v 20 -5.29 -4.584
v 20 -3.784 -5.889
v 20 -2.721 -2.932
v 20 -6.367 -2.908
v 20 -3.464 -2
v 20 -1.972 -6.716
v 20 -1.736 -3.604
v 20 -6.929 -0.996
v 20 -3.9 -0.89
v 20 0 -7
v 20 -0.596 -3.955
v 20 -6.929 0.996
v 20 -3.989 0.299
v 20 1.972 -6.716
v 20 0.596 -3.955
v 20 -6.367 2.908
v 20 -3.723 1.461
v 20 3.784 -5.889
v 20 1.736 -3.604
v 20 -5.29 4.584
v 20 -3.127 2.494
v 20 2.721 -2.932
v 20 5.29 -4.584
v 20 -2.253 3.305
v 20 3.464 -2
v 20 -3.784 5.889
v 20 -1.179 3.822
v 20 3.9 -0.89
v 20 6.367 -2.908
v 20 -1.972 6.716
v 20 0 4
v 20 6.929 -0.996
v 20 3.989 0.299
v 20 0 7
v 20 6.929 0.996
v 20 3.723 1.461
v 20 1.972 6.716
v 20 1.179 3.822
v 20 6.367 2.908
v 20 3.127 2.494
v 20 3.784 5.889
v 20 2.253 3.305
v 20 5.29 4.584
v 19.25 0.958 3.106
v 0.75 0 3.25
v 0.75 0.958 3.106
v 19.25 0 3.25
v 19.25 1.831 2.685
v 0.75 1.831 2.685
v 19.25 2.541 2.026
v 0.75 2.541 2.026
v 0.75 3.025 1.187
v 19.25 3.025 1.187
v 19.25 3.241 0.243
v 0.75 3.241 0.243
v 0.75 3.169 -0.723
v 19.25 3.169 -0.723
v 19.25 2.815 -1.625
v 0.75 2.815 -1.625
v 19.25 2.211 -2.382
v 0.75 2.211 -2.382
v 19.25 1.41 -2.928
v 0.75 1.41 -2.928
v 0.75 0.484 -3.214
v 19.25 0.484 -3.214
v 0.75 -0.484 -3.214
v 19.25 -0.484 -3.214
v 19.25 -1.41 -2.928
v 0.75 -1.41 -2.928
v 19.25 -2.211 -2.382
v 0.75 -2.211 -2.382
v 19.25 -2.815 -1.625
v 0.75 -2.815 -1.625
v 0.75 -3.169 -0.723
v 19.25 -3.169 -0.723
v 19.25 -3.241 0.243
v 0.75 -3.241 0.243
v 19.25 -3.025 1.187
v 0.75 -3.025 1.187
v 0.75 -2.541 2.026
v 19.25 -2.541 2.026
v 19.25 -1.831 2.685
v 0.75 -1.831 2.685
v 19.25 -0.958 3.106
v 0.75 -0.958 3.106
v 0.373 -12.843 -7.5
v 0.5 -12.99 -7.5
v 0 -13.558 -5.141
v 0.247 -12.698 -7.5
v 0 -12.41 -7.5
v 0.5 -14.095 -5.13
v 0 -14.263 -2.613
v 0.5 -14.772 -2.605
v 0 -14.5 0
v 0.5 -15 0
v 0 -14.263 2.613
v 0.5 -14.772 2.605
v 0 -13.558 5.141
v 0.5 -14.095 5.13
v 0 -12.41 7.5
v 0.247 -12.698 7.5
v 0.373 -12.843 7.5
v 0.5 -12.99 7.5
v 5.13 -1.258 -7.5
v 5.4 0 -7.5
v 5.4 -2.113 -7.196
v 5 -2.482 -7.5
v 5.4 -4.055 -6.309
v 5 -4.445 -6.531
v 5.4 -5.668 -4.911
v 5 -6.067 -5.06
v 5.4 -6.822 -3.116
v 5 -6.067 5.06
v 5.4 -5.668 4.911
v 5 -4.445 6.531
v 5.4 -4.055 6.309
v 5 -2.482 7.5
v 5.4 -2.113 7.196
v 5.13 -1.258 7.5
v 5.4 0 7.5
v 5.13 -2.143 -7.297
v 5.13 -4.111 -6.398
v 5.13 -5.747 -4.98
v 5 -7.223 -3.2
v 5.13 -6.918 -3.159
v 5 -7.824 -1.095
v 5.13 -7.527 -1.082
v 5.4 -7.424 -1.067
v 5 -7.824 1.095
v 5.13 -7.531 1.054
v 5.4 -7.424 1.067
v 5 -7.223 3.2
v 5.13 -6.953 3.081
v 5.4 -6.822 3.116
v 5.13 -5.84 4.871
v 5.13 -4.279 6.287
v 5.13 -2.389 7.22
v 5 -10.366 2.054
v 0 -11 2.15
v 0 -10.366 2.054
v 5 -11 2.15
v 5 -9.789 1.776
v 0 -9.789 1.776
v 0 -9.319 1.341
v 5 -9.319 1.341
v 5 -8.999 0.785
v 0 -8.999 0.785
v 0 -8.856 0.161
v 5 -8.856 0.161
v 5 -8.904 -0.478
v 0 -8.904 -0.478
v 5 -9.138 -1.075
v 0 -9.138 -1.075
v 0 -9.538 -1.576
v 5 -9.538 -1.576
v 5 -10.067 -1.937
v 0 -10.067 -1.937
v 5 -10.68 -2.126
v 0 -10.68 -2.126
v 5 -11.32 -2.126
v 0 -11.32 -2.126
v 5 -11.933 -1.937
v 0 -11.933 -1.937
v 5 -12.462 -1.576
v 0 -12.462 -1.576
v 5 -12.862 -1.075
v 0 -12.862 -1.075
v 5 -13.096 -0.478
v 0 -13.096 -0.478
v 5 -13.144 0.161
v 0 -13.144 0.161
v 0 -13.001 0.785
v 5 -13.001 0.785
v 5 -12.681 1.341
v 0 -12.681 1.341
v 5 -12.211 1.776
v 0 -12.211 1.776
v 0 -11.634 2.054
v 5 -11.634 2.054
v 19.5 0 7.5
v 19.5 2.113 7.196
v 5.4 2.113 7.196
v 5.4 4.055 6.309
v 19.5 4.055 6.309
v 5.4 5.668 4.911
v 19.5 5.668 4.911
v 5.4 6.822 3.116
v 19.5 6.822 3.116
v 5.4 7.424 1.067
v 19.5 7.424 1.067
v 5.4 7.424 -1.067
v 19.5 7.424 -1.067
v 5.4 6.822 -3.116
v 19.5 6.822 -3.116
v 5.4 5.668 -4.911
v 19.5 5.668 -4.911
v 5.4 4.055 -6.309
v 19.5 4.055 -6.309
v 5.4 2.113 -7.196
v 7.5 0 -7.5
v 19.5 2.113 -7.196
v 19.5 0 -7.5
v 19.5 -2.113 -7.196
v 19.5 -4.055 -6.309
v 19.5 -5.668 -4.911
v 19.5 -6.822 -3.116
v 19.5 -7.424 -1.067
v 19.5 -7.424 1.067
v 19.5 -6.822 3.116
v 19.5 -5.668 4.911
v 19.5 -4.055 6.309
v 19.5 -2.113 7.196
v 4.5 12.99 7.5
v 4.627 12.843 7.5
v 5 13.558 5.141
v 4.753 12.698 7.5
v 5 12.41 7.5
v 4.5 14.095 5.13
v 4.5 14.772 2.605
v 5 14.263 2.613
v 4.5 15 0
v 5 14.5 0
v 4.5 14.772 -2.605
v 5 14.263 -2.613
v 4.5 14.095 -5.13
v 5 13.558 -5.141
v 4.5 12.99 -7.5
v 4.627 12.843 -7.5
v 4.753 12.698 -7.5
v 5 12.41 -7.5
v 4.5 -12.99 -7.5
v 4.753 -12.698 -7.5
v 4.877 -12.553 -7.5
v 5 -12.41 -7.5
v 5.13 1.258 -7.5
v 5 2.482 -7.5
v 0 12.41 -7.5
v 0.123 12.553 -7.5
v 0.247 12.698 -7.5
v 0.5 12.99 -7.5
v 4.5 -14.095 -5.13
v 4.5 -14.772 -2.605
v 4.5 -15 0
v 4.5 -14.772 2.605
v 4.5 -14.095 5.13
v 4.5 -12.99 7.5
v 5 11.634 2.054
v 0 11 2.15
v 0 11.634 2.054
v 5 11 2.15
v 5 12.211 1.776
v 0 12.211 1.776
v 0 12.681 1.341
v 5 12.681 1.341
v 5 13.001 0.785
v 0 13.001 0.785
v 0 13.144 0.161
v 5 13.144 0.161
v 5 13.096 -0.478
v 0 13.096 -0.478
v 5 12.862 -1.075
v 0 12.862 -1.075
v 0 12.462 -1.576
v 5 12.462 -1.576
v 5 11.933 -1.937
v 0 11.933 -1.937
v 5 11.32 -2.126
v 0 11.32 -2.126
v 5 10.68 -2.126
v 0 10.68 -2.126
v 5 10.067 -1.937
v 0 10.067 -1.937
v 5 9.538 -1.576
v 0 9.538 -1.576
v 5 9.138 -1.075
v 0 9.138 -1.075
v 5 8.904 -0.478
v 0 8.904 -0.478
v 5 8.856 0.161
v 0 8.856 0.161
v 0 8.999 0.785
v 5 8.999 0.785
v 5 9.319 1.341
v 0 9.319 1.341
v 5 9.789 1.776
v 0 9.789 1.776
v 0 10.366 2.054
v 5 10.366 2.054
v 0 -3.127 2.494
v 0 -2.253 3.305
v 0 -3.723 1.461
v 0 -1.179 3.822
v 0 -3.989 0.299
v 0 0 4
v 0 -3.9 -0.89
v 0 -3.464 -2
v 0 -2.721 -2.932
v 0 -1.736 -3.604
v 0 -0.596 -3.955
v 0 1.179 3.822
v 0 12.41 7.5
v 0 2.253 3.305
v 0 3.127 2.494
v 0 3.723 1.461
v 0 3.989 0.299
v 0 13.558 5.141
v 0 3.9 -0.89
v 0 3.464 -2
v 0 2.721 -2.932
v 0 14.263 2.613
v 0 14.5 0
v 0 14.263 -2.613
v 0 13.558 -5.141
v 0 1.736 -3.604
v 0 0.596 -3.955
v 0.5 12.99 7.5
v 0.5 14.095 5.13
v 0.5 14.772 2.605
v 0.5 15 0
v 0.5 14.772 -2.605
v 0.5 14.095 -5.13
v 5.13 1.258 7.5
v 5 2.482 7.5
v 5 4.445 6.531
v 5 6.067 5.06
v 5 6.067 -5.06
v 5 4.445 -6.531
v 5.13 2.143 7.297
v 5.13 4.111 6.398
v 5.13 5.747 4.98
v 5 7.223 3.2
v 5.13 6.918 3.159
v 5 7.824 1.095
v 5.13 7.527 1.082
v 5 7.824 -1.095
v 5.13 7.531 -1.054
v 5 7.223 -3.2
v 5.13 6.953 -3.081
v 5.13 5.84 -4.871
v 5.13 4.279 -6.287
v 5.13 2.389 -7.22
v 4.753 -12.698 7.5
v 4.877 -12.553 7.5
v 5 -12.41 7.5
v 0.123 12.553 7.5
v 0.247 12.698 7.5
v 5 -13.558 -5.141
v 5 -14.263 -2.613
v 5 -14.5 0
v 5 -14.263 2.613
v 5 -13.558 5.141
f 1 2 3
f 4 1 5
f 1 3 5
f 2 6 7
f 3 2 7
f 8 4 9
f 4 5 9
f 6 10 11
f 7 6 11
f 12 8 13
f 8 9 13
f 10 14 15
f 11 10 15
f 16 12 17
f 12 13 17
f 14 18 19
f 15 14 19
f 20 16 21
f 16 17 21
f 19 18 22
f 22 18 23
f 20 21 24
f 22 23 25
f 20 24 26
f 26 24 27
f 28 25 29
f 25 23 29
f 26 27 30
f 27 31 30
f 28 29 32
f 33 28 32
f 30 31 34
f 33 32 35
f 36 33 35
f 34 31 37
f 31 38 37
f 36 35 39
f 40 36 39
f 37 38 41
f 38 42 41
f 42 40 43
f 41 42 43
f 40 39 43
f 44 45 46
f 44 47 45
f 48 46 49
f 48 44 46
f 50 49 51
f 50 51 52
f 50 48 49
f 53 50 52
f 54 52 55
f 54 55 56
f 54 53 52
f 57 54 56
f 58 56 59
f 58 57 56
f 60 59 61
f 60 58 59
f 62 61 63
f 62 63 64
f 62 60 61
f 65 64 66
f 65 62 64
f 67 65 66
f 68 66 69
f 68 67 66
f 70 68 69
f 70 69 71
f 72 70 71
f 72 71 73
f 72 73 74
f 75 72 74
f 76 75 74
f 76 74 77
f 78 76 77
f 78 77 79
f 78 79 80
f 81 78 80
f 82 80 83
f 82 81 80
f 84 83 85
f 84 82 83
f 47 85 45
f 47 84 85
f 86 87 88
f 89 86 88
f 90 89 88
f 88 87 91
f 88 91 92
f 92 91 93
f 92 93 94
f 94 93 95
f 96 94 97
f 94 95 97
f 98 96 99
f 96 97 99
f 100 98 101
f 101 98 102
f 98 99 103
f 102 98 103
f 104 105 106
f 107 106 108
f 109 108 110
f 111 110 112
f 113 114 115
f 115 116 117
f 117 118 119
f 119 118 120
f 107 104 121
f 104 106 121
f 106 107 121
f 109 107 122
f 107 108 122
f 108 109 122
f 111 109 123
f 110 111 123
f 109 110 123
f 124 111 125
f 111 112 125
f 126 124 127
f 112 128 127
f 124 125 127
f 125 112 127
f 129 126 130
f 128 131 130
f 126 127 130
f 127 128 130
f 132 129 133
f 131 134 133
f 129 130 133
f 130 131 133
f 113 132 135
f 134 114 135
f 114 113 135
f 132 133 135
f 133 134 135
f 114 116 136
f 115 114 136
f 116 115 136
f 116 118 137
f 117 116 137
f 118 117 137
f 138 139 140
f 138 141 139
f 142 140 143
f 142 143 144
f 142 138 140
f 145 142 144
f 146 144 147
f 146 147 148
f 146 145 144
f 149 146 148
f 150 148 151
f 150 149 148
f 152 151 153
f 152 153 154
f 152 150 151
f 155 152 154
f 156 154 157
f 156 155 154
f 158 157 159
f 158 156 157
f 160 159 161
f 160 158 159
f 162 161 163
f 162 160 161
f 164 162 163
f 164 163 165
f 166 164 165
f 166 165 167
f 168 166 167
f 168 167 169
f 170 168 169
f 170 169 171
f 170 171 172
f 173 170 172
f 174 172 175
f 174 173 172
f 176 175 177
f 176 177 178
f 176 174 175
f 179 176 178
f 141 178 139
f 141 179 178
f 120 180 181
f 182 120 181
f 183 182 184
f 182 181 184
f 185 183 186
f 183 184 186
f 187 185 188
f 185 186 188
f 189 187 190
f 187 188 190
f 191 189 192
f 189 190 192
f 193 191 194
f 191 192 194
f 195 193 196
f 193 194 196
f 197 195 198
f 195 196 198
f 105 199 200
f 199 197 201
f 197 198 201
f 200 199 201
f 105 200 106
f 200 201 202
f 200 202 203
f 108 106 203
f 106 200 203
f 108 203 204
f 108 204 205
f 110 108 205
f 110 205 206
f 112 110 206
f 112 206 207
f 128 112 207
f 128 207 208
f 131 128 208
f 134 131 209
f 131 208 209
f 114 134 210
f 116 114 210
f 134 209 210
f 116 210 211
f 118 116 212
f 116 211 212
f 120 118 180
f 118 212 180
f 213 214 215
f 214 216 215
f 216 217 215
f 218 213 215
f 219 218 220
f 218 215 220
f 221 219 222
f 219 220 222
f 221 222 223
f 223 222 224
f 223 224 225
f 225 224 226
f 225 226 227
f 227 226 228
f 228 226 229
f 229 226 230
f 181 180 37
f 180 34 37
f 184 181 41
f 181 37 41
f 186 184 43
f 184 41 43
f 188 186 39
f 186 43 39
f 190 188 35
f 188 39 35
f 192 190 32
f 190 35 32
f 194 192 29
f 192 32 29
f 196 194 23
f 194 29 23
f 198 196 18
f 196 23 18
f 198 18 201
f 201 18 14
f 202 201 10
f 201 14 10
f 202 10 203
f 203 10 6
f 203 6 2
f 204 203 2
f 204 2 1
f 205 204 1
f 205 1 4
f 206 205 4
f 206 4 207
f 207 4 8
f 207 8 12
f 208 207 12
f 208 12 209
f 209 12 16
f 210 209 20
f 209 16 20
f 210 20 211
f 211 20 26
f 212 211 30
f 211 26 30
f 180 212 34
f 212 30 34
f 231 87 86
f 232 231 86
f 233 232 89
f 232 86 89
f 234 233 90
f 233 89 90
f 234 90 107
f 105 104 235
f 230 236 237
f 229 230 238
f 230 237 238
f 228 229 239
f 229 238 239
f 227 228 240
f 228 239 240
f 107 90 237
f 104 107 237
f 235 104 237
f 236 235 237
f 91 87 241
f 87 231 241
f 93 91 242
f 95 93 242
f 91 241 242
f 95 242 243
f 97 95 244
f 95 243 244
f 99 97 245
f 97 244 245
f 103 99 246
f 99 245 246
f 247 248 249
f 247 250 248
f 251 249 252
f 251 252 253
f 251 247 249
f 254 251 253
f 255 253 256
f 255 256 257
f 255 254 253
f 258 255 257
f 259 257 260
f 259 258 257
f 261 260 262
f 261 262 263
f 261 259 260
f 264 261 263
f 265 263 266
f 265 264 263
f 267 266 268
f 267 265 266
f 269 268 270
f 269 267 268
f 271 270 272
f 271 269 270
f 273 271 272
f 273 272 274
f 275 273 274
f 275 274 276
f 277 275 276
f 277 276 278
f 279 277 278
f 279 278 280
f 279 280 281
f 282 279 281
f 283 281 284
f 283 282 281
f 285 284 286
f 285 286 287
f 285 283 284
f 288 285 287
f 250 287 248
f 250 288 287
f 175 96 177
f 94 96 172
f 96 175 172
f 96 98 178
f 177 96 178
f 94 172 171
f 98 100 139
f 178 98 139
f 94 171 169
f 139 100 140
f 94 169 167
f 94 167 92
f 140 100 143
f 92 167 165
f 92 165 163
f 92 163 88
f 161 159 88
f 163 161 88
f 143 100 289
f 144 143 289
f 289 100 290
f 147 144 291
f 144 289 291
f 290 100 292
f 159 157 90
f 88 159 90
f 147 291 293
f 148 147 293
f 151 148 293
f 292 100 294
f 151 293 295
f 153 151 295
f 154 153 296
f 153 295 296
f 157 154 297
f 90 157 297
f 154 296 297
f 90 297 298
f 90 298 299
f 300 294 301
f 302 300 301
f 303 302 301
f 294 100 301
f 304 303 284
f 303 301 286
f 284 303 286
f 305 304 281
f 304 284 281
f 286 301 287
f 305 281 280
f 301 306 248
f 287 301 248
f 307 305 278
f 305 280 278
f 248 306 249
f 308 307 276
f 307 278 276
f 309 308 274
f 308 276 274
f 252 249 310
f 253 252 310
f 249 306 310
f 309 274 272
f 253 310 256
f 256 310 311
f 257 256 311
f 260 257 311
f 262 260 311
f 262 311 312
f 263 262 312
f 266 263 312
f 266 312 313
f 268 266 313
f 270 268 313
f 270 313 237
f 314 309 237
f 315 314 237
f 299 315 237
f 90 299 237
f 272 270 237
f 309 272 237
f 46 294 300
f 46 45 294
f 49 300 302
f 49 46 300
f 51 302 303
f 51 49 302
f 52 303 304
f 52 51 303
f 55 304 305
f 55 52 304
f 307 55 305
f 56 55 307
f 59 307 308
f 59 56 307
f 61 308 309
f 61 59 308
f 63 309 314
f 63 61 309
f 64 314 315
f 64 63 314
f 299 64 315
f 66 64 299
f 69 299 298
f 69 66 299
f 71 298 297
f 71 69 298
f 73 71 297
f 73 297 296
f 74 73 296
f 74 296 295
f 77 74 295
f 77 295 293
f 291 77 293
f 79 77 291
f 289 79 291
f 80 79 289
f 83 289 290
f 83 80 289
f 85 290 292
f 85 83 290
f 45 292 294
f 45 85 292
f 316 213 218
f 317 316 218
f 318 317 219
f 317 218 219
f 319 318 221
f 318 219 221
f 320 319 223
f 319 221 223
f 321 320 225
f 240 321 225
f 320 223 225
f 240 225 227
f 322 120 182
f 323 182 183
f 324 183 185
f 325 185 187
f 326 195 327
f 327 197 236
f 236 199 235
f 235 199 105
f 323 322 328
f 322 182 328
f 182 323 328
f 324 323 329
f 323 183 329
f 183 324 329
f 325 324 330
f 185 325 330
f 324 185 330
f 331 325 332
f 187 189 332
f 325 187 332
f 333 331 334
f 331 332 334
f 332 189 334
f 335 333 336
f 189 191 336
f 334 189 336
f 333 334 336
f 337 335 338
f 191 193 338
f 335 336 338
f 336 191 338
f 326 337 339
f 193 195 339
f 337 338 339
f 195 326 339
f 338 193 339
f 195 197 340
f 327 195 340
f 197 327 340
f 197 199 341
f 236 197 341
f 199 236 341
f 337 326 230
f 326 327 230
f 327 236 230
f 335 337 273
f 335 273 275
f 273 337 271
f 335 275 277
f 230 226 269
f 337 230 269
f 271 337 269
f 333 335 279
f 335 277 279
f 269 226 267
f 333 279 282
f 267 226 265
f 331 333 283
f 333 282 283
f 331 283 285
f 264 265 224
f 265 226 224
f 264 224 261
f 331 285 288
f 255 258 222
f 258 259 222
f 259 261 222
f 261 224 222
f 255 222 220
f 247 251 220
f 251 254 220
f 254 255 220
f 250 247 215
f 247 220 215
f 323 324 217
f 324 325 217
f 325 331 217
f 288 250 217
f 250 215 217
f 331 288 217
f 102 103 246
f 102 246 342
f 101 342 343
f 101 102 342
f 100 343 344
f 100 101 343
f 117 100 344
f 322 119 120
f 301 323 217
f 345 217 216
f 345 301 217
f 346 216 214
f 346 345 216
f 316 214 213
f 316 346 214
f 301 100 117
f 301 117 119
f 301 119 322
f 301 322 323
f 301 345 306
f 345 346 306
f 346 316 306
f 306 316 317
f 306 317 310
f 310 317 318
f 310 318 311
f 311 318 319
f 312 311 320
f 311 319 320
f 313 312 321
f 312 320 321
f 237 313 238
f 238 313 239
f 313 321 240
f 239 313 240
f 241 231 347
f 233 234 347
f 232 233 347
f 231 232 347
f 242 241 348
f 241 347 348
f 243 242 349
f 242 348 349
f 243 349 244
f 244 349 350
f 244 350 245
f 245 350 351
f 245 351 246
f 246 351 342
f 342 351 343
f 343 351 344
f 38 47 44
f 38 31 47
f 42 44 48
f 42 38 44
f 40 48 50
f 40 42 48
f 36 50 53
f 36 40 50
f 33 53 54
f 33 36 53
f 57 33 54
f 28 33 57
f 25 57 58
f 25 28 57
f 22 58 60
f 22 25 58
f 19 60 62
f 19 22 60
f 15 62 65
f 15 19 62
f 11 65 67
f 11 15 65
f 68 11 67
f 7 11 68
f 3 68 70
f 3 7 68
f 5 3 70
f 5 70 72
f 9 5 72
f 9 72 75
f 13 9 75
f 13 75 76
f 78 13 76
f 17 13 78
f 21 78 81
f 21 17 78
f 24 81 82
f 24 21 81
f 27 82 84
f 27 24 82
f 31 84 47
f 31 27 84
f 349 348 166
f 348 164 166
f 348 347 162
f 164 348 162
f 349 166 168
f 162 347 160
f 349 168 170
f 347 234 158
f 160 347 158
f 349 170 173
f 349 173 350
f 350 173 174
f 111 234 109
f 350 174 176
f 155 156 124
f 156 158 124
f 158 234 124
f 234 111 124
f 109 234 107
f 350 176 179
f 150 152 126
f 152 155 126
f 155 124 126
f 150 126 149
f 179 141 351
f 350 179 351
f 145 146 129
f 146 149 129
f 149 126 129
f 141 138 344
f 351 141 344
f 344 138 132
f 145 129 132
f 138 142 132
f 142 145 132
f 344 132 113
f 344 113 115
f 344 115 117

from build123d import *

# Parameters (mm, degrees)
SKETCH3_W               = 5
SKETCH3_H               = 2.15
SKETCH4_W               = 5
SKETCH4_H               = 2.15
CUT_EXTRUDE1_DEPTH      = 7.5
CUT_EXTRUDE1_DEPTH_BACK = 7.5
SKETCH5_W               = 30
SKETCH5_H               = 90
SKETCH5_W_2             = 15
SKETCH5_H_2             = 60


with BuildPart() as part:
    # Sketch1 → Revolve1 (revolve)
    with BuildSketch(Plane.XY, mode=Mode.PRIVATE) as revolve1_sk:
        with BuildLine():
            Line((0, 0), (0, 14.5))
            Line((0, 14.5), (0.5, 15))
            Line((0.5, 15), (4.5, 15))
            Line((4.5, 15), (5, 14.5))
            Line((5, 14.5), (5, 7.9))
            ThreePointArc((5, 7.9), (5.117157288, 7.617157288), (5.4, 7.5))
            Line((5.4, 7.5), (19.5, 7.5))
            Line((19.5, 7.5), (20, 7))
            Line((20, 7), (20, 0))
            Line((20, 0), (0, 0))
        make_face()
    revolve(revolve1_sk.sketch.rotate(Axis((20, 0, 0), (-1, 0, 0)), 270), axis=Axis((20, 0, 0), (-1, 0, 0)))

    # Sketch2 → Cut-Revolve1 (revolve, cut)
    with BuildSketch(Plane.XY, mode=Mode.PRIVATE) as cut_revolve1_sk:
        Polygon((0, 0), (0, 4), (0.75, 3.25), (19.25, 3.25), (20, 4), (20, 0), align=None)
    revolve(cut_revolve1_sk.sketch.rotate(Axis((20, 0, 0), (-1, 0, 0)), 270), axis=Axis((20, 0, 0), (-1, 0, 0)), mode=Mode.SUBTRACT)

    # Sketch3 → Cut-Revolve2 (revolve, cut)
    with BuildSketch(Plane.XY, mode=Mode.PRIVATE) as cut_revolve2_sk:
        with Locations((2.5, 12.075)):
            Rectangle(SKETCH3_W, SKETCH3_H)
    revolve(cut_revolve2_sk.sketch.rotate(Axis((5, 11, 0), (-1, 0, 0)), 270), axis=Axis((5, 11, 0), (-1, 0, 0)), mode=Mode.SUBTRACT)

    # Sketch4 → Cut-Revolve3 (revolve, cut)
    with BuildSketch(Plane.XY, mode=Mode.PRIVATE) as cut_revolve3_sk:
        with Locations((2.5, -9.925)):
            Rectangle(SKETCH4_W, SKETCH4_H)
    revolve(cut_revolve3_sk.sketch.rotate(Axis((5, -11, 0), (-1, 0, 0)), 270), axis=Axis((5, -11, 0), (-1, 0, 0)), mode=Mode.SUBTRACT)

    # Sketch5 → Cut-Extrude1 (cut, two sides: drawn at the far end of the back side and taken through both)
    with BuildSketch(Plane(origin=(0, 0, 0), x_dir=(0, 0, -1), z_dir=(1, 0, 0)).offset(-CUT_EXTRUDE1_DEPTH_BACK)):
        Rectangle(SKETCH5_W, SKETCH5_H)
        Rectangle(SKETCH5_W_2, SKETCH5_H_2, mode=Mode.SUBTRACT)
    extrude(amount=CUT_EXTRUDE1_DEPTH + CUT_EXTRUDE1_DEPTH_BACK, mode=Mode.SUBTRACT)


solid = part.part
